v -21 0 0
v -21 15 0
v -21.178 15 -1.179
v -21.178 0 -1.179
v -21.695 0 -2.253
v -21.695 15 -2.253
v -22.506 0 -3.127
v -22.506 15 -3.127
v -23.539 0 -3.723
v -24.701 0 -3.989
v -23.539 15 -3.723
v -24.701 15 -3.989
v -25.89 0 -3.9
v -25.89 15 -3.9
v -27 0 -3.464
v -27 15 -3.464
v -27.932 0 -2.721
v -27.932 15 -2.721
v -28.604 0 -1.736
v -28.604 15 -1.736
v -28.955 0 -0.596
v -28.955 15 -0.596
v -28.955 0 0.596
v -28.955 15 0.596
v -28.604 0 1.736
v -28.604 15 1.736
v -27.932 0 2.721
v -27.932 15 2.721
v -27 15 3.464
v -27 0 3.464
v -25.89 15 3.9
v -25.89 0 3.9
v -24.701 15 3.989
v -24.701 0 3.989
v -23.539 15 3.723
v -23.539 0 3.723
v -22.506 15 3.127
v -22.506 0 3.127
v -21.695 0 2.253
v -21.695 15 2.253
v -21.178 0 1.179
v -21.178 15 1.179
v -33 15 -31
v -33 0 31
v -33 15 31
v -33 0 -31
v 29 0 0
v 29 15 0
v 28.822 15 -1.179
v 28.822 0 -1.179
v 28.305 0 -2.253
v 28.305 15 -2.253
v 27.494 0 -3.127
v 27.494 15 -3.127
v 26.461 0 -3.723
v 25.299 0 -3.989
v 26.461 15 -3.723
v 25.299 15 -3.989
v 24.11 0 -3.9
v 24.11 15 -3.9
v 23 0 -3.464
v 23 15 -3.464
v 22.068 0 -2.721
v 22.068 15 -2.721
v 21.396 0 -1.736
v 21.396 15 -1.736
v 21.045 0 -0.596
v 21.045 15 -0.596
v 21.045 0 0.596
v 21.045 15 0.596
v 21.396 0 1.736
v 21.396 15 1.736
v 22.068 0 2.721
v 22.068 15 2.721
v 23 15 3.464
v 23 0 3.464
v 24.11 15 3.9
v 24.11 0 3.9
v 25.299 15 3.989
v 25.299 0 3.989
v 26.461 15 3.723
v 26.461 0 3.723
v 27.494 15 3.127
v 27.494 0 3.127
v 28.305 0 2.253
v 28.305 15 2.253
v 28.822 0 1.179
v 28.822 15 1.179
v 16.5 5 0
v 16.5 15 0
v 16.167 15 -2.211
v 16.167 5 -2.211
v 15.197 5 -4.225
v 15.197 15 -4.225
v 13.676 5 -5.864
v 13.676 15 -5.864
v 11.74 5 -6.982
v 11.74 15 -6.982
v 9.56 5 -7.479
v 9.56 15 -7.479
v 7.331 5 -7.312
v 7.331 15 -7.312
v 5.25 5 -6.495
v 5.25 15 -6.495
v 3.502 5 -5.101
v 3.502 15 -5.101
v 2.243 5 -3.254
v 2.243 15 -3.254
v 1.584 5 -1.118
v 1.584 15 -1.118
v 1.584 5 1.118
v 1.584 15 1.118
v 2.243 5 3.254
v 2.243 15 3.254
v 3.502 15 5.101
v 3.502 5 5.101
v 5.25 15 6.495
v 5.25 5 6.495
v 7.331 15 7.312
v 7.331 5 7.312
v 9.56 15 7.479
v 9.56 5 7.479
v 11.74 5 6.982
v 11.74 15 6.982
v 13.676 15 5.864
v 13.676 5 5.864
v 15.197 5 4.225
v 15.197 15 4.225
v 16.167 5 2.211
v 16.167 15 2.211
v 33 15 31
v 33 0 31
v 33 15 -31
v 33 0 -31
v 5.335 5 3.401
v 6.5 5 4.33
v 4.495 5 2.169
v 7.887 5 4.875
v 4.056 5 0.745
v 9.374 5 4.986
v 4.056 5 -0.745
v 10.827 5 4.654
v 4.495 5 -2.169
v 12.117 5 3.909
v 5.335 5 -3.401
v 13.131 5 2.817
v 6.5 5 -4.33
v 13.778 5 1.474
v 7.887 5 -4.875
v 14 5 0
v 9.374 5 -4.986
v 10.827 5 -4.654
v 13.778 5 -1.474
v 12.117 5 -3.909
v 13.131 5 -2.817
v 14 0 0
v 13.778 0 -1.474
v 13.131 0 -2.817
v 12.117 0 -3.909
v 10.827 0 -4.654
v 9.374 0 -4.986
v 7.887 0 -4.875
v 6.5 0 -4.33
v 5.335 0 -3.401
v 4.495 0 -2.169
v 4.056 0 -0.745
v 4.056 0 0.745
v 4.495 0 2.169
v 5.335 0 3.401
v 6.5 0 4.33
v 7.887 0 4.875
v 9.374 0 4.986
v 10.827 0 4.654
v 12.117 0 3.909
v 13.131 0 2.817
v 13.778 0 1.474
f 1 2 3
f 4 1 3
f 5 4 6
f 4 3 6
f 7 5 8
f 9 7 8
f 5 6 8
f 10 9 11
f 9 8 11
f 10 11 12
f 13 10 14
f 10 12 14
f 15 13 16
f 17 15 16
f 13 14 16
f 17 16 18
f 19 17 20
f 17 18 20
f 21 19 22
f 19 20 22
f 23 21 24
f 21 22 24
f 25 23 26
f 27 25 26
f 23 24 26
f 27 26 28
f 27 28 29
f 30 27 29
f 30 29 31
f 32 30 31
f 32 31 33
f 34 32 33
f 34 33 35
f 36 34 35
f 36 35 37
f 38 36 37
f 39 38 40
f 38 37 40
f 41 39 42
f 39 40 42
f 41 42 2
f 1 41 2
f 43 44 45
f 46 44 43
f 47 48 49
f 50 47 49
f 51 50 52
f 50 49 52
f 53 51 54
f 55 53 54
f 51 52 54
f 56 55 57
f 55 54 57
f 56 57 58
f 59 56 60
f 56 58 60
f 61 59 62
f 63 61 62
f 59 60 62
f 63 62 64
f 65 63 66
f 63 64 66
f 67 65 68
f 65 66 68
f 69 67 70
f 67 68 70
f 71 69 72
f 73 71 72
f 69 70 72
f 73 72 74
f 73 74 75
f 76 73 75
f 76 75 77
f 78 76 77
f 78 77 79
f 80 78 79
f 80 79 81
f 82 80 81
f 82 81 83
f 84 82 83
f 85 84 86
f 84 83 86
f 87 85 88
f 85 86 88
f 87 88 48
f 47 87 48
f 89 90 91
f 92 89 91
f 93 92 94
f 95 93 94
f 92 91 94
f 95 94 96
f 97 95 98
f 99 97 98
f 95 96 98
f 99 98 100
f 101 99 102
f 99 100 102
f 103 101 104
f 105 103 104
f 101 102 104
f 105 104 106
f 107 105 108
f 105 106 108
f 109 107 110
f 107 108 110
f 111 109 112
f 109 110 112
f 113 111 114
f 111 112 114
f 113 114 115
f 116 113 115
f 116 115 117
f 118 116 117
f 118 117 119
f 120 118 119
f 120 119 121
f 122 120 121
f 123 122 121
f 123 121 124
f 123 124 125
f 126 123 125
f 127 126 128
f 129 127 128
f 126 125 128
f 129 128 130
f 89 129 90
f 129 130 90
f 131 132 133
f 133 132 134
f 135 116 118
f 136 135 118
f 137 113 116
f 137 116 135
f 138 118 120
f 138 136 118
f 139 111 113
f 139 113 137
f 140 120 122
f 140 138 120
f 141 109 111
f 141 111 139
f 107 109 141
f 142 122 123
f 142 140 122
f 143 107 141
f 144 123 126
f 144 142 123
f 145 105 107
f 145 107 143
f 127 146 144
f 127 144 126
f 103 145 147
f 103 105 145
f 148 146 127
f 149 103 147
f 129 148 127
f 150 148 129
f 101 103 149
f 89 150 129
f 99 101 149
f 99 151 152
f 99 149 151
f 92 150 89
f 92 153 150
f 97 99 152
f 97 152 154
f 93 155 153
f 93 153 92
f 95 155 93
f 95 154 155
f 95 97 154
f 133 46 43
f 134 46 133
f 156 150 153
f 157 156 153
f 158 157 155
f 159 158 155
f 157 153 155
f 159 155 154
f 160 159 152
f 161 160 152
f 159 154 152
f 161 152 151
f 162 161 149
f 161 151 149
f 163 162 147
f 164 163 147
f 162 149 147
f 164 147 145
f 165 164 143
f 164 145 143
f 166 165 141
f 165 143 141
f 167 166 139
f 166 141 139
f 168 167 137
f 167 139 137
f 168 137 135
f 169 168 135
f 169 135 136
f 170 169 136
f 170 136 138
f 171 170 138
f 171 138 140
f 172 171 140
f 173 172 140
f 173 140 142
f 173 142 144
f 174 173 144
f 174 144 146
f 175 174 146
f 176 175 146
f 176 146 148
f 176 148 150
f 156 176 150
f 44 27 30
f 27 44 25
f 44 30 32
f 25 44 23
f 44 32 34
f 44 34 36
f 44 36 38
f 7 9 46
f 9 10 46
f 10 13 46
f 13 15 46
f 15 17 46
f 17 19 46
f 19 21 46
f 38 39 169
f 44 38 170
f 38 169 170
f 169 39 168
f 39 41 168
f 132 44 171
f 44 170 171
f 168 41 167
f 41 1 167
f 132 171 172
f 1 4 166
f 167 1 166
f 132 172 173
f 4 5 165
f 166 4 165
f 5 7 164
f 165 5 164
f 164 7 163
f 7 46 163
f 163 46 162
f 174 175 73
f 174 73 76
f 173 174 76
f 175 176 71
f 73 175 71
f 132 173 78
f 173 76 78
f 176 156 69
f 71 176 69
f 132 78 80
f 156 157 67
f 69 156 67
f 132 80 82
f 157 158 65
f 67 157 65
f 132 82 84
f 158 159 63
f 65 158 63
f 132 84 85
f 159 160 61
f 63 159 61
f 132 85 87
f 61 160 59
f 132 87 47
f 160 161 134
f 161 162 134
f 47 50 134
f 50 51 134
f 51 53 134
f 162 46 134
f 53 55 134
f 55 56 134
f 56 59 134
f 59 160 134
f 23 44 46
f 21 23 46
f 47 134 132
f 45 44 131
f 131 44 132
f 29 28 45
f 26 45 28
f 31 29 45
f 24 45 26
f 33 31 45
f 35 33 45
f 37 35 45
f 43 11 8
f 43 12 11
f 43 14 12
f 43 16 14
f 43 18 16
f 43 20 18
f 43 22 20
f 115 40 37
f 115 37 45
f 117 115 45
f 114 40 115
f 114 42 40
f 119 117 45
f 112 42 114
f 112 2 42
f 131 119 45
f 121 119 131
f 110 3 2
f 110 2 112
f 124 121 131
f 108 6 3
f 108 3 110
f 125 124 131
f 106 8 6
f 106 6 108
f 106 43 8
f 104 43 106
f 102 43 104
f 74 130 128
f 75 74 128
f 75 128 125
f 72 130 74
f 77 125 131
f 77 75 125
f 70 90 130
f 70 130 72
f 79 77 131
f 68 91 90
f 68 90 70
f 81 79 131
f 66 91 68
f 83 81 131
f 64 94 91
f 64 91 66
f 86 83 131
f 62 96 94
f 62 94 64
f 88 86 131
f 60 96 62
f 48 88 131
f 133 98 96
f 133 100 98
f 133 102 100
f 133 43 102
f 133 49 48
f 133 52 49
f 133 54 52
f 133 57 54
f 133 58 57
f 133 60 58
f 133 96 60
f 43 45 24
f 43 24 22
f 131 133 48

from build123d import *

# Parameters (mm, degrees)
CROQUIS1_W              = 66
CROQUIS1_H              = 62
SALIENTE_EXTRUIR1_DEPTH = 15
CROQUIS2_R              = 5
CROQUIS2_R_2            = 4
CORTAR_EXTRUIR1_DEPTH   = 15
CROQUIS3_R              = 7.5
CORTAR_EXTRUIR2_DEPTH   = 10


with BuildPart() as part:
    # Croquis1 → Saliente-Extruir1 (new body)
    with BuildSketch(Plane(origin=(0, 0, 0), x_dir=(1, 0, 0), z_dir=(0, 1, 0))):
        Rectangle(CROQUIS1_W, CROQUIS1_H)
    extrude(amount=SALIENTE_EXTRUIR1_DEPTH)

    # Croquis2 → Cortar-Extruir1 (cut)
    with BuildSketch(Plane(origin=(0, 15, 0), x_dir=(1, 0, 0), z_dir=(0, 1, 0))):
        with Locations((9, 0)):
            Circle(CROQUIS2_R)
        with Locations((-25, 0)):
            Circle(CROQUIS2_R_2)
        with Locations((25, 0)):
            Circle(CROQUIS2_R_2)
    extrude(amount=-CORTAR_EXTRUIR1_DEPTH, mode=Mode.SUBTRACT)

    # Croquis3 → Cortar-Extruir2 (cut)
    with BuildSketch(Plane(origin=(0, 15, 0), x_dir=(1, 0, 0), z_dir=(0, 1, 0))):
        with Locations((9, 0)):
            Circle(CROQUIS3_R)
    extrude(amount=-CORTAR_EXTRUIR2_DEPTH, mode=Mode.SUBTRACT)


solid = part.part
